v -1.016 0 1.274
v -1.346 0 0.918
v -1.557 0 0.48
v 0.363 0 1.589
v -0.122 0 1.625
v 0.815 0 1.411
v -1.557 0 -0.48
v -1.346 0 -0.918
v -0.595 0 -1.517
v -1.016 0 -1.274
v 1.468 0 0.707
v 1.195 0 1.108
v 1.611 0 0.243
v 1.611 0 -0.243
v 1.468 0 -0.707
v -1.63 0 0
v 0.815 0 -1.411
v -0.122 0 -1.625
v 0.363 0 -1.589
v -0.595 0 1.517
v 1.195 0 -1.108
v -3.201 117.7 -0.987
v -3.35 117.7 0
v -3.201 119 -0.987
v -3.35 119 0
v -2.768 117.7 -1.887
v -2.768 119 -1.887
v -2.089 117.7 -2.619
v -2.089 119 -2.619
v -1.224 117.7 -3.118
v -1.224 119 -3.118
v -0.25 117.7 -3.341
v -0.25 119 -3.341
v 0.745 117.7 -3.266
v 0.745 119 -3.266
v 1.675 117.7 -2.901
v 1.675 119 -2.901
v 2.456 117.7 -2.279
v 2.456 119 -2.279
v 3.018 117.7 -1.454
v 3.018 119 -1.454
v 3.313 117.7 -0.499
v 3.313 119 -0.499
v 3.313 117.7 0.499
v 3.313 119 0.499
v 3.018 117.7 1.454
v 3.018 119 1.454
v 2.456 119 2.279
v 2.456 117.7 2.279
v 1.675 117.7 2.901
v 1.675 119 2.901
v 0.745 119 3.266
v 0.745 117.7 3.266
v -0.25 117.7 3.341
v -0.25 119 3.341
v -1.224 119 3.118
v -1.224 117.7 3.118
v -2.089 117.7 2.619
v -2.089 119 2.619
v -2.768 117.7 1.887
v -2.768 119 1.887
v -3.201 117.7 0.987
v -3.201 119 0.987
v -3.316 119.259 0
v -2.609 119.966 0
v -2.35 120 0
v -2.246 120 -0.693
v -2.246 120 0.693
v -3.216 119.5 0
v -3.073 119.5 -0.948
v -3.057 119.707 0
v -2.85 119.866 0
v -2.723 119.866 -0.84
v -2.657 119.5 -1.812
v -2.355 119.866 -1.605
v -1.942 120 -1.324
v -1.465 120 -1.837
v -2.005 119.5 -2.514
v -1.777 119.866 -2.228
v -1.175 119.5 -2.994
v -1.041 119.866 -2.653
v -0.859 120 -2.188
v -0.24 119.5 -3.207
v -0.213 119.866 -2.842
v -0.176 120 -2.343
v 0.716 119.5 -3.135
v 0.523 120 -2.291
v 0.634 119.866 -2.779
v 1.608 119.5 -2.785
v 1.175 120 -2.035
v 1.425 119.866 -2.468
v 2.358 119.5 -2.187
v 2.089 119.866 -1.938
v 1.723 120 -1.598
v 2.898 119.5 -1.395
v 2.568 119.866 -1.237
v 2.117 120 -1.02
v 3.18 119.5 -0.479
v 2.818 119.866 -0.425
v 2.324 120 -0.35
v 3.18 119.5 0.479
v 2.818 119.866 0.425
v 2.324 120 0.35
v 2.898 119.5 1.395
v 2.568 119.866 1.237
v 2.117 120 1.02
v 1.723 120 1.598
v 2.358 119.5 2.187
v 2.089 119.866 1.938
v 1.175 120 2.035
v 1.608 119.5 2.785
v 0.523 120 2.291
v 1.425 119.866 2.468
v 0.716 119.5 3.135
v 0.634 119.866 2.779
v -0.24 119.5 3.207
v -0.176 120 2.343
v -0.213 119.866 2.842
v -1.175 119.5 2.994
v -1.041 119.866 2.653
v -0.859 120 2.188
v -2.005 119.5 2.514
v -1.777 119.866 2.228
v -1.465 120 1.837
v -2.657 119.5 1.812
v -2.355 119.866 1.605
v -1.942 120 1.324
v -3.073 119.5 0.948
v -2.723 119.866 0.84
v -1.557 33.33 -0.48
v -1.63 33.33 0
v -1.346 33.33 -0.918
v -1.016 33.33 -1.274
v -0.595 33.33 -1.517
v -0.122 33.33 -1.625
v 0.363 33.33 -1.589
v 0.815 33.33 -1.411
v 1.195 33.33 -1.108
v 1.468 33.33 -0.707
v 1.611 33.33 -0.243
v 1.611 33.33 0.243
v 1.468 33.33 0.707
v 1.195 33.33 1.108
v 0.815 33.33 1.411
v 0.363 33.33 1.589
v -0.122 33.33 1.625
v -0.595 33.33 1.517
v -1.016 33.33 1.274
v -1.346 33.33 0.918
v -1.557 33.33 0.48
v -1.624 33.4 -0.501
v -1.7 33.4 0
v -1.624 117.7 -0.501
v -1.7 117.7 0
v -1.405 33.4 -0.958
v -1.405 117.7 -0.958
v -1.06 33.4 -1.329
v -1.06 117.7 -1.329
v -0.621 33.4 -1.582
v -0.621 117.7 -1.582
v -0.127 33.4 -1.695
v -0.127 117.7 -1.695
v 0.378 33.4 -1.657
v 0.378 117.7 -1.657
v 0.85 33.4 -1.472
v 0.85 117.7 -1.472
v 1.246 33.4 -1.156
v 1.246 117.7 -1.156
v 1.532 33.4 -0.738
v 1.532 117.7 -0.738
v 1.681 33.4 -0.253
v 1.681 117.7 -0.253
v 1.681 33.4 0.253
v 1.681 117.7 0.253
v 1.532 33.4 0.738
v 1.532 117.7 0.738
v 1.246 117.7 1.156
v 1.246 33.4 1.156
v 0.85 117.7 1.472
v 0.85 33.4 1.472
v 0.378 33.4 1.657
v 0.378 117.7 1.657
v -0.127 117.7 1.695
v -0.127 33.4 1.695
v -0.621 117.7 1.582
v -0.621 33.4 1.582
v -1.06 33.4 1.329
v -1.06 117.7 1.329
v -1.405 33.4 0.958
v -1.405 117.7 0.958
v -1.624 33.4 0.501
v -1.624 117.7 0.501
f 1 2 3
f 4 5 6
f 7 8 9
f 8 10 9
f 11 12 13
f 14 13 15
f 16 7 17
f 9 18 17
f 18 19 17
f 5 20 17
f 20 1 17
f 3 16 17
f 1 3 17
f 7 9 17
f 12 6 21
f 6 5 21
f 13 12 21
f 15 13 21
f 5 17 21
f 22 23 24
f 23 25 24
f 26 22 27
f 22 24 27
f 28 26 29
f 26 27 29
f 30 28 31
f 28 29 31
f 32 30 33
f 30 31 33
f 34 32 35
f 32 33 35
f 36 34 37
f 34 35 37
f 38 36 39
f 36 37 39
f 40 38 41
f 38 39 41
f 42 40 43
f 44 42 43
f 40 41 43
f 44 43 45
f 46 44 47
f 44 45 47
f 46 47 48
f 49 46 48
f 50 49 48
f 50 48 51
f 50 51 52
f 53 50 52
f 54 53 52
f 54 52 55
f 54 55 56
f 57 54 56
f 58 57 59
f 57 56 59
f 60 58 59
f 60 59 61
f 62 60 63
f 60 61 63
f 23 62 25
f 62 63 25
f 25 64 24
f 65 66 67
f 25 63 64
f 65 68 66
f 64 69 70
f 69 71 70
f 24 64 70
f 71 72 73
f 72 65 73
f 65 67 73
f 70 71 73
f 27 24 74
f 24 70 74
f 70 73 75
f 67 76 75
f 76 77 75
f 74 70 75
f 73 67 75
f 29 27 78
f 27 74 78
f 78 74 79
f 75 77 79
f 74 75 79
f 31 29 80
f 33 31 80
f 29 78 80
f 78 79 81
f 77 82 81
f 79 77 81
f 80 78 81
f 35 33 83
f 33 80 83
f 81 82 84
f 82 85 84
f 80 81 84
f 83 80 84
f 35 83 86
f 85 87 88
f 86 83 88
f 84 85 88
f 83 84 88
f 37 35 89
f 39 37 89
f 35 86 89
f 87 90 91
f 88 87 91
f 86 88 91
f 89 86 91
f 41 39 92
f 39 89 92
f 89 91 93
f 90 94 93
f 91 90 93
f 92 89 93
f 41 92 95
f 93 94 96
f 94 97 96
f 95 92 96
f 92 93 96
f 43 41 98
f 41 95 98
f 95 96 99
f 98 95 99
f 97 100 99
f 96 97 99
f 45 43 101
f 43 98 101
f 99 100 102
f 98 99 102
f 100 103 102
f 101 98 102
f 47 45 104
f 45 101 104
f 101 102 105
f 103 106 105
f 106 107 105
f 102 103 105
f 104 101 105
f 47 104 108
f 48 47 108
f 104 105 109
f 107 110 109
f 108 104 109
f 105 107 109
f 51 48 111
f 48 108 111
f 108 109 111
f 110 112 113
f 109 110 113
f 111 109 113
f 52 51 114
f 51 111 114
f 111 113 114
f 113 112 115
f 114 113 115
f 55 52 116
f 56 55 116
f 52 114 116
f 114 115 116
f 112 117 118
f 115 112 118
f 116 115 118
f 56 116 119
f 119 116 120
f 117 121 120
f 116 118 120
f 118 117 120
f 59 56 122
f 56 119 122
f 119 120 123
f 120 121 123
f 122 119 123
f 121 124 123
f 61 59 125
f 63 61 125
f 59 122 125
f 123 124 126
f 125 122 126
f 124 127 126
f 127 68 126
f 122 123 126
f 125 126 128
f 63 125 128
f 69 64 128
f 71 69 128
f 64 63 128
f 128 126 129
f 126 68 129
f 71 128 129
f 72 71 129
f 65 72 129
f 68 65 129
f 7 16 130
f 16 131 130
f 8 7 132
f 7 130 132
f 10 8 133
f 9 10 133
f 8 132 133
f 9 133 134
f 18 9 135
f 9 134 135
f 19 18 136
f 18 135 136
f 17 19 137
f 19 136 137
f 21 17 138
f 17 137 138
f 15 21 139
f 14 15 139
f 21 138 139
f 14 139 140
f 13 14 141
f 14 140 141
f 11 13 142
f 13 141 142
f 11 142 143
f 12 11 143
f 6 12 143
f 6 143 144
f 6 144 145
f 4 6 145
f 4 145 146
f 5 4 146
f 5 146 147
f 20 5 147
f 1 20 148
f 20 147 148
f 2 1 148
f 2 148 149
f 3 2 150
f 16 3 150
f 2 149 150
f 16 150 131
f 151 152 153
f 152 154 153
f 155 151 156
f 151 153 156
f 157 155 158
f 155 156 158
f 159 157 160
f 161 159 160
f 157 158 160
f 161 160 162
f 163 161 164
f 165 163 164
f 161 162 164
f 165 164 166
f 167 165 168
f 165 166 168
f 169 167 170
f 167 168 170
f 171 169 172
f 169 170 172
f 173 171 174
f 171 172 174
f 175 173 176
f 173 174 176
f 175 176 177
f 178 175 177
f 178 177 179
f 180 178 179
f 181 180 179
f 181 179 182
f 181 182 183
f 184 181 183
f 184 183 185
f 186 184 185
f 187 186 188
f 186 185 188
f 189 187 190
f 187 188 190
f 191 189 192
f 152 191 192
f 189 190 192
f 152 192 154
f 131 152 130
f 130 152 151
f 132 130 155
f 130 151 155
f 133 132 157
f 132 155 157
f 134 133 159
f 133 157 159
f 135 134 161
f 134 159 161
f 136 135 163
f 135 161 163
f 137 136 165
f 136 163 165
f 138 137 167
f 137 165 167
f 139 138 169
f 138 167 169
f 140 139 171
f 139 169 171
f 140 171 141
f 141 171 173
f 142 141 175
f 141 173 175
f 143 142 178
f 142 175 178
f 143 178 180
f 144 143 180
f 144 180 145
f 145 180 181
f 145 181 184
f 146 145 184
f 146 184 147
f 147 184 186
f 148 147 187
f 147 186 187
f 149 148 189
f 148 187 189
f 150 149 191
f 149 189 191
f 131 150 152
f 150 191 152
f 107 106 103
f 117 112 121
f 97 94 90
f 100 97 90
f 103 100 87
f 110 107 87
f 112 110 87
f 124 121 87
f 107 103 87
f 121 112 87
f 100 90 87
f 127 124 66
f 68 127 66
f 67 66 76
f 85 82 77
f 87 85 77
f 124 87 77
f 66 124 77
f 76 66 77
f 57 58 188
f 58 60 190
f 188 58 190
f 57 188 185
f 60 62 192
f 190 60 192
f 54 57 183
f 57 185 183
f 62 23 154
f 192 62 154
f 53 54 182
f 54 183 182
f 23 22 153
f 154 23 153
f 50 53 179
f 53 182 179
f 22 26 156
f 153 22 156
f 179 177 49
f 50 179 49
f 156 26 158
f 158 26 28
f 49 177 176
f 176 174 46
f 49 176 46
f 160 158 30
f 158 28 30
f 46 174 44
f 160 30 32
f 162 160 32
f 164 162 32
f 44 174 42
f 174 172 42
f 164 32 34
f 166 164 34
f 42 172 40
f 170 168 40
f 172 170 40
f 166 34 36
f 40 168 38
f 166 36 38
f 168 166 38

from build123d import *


with BuildPart() as part:
    # Croquis1 → Revolución1 (revolve)
    with BuildSketch(Plane.XY):
        with BuildLine():
            Line((0, 120), (0, 0))
            Line((0, 0), (-1.629604709, 0))
            Line((-1.629604709, 0), (-1.629604709, 33.329604709))
            Line((-1.629604709, 33.329604709), (-1.7, 33.4))
            Line((-1.7, 33.4), (-1.7, 117.7))
            Line((-1.7, 117.7), (-3.35, 117.7))
            Line((-3.35, 117.7), (-3.35, 119))
            ThreePointArc((-3.35, 119), (-3.057106781, 119.707106781), (-2.35, 120))
            Line((-2.35, 120), (0, 120))
        make_face()
    revolve(axis=Axis((0, 120, 0), (0, -1, 0)))


solid = part.part
